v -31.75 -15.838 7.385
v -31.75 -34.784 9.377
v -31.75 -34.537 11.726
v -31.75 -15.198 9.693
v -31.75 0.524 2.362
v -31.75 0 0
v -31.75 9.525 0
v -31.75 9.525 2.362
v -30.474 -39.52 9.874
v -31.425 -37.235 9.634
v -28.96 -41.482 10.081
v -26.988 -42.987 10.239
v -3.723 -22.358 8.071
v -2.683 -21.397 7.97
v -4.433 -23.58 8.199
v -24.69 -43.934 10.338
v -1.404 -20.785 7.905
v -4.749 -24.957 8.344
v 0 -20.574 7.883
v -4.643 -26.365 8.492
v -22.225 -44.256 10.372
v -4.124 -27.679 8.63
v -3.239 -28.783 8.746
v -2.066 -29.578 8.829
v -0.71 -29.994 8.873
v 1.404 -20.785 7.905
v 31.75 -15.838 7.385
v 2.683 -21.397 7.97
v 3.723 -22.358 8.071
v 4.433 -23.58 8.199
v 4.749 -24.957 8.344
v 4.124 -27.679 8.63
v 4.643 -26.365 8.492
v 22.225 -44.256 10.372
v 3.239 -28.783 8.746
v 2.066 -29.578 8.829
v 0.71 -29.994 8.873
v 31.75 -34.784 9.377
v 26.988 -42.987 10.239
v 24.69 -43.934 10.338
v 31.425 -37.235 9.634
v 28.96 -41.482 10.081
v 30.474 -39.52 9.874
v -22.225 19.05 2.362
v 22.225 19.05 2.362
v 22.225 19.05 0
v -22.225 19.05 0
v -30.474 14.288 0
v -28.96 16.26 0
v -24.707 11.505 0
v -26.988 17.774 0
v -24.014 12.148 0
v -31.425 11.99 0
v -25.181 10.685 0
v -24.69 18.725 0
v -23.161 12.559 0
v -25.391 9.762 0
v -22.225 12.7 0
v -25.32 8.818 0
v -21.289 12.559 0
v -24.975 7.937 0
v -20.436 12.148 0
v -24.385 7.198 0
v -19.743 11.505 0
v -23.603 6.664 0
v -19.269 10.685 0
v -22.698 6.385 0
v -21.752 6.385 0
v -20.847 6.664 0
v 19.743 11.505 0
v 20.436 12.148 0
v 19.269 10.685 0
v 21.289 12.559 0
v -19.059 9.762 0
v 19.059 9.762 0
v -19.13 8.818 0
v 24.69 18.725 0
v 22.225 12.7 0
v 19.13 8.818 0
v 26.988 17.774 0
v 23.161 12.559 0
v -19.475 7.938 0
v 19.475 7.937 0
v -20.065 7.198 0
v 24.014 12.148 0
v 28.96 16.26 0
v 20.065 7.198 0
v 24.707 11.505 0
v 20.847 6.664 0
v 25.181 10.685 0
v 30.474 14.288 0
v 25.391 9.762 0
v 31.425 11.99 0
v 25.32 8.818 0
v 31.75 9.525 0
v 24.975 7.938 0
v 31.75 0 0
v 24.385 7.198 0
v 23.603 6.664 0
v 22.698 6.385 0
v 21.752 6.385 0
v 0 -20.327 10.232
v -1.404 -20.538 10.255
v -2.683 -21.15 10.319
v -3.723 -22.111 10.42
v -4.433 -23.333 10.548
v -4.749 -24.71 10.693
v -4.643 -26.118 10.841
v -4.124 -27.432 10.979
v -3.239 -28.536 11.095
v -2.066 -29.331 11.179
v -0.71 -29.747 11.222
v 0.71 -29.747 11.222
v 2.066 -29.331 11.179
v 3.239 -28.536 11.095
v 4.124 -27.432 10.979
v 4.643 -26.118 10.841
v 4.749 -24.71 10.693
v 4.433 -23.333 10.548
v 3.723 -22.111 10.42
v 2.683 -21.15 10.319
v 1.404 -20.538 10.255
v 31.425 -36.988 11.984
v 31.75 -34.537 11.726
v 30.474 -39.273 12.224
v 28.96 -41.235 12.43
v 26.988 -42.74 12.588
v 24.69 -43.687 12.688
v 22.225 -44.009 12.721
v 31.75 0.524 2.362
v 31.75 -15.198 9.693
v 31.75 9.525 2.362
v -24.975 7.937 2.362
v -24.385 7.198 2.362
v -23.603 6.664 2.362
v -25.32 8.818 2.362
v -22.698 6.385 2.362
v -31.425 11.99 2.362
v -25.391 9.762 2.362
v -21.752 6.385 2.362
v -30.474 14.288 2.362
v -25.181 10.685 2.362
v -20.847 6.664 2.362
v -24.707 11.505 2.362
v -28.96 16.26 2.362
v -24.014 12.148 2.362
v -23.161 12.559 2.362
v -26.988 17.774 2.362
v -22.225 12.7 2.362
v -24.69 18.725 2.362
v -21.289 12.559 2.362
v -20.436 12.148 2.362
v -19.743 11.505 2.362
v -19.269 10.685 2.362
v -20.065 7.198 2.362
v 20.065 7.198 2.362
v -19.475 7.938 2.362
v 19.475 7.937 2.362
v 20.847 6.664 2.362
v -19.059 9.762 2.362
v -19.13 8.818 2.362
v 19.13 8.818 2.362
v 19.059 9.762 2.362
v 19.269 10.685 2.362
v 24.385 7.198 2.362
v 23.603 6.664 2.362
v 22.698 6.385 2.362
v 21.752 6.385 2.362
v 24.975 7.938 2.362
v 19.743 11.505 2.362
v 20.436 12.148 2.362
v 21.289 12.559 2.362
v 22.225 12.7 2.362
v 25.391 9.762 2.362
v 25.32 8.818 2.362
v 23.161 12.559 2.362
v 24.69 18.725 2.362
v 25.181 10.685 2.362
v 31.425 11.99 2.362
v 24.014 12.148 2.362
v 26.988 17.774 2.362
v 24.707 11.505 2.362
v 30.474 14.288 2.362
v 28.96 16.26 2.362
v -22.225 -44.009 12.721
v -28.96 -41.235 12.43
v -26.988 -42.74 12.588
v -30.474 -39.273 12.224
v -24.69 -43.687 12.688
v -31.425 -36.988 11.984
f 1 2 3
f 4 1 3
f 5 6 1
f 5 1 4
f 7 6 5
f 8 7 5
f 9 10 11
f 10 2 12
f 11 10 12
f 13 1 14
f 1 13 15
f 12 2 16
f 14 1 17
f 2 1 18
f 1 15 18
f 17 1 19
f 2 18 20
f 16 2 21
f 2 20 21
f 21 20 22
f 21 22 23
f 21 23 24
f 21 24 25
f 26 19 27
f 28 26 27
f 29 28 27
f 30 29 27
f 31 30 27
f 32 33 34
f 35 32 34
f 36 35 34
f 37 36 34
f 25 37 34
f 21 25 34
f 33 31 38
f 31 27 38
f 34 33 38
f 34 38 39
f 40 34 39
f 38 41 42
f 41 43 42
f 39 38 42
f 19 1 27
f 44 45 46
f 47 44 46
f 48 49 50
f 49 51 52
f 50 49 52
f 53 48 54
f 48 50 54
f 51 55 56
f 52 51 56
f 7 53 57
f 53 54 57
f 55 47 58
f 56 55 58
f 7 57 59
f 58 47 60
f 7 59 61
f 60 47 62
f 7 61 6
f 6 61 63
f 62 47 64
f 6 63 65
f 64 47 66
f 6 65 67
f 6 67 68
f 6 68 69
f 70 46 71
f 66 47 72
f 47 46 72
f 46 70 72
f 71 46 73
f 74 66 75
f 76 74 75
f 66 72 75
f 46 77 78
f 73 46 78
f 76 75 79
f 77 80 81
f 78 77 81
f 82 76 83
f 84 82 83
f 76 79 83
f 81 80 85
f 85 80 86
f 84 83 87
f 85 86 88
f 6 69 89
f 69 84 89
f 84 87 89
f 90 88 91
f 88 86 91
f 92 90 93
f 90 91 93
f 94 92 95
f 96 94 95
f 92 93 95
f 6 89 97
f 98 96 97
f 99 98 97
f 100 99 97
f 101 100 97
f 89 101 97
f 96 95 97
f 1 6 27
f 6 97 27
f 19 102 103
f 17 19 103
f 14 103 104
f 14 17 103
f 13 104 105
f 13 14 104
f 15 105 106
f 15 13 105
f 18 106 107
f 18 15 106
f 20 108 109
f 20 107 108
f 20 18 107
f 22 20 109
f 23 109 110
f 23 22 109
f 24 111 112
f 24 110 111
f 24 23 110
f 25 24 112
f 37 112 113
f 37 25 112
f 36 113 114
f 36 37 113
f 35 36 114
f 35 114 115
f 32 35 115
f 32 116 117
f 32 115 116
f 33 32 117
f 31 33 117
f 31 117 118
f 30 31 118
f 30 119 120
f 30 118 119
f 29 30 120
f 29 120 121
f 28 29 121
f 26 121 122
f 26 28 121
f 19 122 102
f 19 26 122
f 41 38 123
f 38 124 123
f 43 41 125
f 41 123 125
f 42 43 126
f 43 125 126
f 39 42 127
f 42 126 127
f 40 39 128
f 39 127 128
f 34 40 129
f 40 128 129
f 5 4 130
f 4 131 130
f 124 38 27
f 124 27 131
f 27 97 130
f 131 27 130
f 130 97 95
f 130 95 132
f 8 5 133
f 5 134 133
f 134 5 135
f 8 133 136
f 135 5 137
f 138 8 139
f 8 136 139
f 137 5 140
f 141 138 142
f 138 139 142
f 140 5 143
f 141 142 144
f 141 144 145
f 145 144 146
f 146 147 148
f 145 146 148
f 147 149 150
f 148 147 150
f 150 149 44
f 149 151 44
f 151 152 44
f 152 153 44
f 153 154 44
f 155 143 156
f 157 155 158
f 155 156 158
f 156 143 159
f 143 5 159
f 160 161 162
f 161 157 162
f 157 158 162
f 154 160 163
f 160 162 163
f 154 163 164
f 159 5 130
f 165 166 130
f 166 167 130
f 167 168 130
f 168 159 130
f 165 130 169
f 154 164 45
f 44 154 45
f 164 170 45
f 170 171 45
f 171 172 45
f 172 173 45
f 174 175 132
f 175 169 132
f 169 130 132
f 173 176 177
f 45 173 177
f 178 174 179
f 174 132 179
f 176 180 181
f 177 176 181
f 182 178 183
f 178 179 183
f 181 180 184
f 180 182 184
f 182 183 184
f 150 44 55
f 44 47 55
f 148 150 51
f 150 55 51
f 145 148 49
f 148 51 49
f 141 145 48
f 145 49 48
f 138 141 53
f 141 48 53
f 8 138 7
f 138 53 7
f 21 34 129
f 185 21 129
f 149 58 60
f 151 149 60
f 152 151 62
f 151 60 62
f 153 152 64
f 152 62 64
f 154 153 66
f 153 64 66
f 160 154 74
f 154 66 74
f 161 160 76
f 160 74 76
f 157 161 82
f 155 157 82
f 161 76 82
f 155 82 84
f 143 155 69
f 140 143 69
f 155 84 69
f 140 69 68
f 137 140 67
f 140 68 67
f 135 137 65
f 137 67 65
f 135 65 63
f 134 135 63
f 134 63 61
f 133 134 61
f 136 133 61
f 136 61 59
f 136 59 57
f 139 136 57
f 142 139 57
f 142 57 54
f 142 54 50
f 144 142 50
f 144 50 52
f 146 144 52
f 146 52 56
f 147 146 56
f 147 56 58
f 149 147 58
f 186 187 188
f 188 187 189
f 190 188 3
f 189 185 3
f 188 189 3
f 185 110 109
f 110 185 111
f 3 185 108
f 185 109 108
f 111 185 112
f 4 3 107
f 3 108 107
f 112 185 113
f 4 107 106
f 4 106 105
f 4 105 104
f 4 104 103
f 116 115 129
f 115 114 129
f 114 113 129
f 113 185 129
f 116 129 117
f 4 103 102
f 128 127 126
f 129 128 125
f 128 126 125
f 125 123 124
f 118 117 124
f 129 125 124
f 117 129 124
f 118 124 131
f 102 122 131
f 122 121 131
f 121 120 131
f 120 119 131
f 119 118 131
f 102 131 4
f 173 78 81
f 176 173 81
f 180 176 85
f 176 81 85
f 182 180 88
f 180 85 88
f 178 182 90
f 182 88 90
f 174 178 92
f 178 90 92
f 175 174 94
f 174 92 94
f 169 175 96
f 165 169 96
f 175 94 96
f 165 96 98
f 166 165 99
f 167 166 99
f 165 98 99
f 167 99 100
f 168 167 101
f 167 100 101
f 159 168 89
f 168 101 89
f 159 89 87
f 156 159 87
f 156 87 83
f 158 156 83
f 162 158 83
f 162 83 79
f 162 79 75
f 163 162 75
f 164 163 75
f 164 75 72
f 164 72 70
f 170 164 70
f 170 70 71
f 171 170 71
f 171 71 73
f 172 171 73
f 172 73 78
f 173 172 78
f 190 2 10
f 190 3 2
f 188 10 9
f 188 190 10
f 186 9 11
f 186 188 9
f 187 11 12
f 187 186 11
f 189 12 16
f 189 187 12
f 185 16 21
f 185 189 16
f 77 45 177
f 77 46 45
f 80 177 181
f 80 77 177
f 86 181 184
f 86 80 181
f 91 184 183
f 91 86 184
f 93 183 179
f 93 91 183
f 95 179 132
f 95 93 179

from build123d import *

# Parameters (mm, degrees)
EXTRUDE_THIN1_DEPTH     = 31.75
CUT_EXTRUDE1_DEPTH      = 79.232951004
CUT_EXTRUDE1_DEPTH_BACK = 79.232951004
SKETCH2_R               = 4.7625
SKETCH3_R               = 3.175
CUT_EXTRUDE2_DEPTH      = 56.93322439
FILLET1_R               = 9.525


with BuildPart() as part:
    # Sketch1 → Extrude-Thin1 (new, symmetric)
    with BuildSketch(Plane(origin=(0, 0, 0), x_dir=(0, 0, -1), z_dir=(1, 0, 0))):
        Polygon((0, 19.05), (0, 0), (-7.385338648, -15.83790984), (-10.372239485, -44.256373), (-12.721499107, -44.009455864), (-9.693278511, -15.19786147), (-2.3622, 0.523687132), (-2.3622, 19.05), align=None)
    extrude(amount=EXTRUDE_THIN1_DEPTH, both=True)

    # Sketch2 → Cut-Extrude1 (cut, two sides: drawn at the far end of the back side and taken through both)
    with BuildSketch(Plane(origin=(0, -51.169527341, 13.474052944), x_dir=(-1, 0, 0), z_dir=(0, 0.10452846326765357, 0.9945218953682734)).offset(-CUT_EXTRUDE1_DEPTH_BACK)):
        with Locations(Location((0, -26.249511152, 0), (0, 0, 270))):
            Circle(SKETCH2_R)
    extrude(amount=CUT_EXTRUDE1_DEPTH + CUT_EXTRUDE1_DEPTH_BACK, mode=Mode.SUBTRACT)

    # Sketch3 → Cut-Extrude2 (cut, through all)
    with BuildSketch(Plane(origin=(0, 0, 0), x_dir=(-1, 0, 0), z_dir=(0, 0, -1))):
        with Locations(Location((-22.225, 9.525, 0), (0, 0, 90))):
            Circle(SKETCH3_R)
        with Locations(Location((22.225, 9.525, 0), (0, 0, 90))):
            Circle(SKETCH3_R)
    extrude(amount=-CUT_EXTRUDE2_DEPTH, mode=Mode.SUBTRACT)

    # Fillet1
    fillet1_edges = [part.edges().sort_by_distance(p)[0] for p in [
        (31.75, 19.05, 1.1811),
        (-31.75, 19.05, 1.1811),
        (31.75, -44.132914432, 11.546869296),
        (-31.75, -44.132914432, 11.546869296),
    ]]
    fillet(fillet1_edges, radius=FILLET1_R)


solid = part.part
